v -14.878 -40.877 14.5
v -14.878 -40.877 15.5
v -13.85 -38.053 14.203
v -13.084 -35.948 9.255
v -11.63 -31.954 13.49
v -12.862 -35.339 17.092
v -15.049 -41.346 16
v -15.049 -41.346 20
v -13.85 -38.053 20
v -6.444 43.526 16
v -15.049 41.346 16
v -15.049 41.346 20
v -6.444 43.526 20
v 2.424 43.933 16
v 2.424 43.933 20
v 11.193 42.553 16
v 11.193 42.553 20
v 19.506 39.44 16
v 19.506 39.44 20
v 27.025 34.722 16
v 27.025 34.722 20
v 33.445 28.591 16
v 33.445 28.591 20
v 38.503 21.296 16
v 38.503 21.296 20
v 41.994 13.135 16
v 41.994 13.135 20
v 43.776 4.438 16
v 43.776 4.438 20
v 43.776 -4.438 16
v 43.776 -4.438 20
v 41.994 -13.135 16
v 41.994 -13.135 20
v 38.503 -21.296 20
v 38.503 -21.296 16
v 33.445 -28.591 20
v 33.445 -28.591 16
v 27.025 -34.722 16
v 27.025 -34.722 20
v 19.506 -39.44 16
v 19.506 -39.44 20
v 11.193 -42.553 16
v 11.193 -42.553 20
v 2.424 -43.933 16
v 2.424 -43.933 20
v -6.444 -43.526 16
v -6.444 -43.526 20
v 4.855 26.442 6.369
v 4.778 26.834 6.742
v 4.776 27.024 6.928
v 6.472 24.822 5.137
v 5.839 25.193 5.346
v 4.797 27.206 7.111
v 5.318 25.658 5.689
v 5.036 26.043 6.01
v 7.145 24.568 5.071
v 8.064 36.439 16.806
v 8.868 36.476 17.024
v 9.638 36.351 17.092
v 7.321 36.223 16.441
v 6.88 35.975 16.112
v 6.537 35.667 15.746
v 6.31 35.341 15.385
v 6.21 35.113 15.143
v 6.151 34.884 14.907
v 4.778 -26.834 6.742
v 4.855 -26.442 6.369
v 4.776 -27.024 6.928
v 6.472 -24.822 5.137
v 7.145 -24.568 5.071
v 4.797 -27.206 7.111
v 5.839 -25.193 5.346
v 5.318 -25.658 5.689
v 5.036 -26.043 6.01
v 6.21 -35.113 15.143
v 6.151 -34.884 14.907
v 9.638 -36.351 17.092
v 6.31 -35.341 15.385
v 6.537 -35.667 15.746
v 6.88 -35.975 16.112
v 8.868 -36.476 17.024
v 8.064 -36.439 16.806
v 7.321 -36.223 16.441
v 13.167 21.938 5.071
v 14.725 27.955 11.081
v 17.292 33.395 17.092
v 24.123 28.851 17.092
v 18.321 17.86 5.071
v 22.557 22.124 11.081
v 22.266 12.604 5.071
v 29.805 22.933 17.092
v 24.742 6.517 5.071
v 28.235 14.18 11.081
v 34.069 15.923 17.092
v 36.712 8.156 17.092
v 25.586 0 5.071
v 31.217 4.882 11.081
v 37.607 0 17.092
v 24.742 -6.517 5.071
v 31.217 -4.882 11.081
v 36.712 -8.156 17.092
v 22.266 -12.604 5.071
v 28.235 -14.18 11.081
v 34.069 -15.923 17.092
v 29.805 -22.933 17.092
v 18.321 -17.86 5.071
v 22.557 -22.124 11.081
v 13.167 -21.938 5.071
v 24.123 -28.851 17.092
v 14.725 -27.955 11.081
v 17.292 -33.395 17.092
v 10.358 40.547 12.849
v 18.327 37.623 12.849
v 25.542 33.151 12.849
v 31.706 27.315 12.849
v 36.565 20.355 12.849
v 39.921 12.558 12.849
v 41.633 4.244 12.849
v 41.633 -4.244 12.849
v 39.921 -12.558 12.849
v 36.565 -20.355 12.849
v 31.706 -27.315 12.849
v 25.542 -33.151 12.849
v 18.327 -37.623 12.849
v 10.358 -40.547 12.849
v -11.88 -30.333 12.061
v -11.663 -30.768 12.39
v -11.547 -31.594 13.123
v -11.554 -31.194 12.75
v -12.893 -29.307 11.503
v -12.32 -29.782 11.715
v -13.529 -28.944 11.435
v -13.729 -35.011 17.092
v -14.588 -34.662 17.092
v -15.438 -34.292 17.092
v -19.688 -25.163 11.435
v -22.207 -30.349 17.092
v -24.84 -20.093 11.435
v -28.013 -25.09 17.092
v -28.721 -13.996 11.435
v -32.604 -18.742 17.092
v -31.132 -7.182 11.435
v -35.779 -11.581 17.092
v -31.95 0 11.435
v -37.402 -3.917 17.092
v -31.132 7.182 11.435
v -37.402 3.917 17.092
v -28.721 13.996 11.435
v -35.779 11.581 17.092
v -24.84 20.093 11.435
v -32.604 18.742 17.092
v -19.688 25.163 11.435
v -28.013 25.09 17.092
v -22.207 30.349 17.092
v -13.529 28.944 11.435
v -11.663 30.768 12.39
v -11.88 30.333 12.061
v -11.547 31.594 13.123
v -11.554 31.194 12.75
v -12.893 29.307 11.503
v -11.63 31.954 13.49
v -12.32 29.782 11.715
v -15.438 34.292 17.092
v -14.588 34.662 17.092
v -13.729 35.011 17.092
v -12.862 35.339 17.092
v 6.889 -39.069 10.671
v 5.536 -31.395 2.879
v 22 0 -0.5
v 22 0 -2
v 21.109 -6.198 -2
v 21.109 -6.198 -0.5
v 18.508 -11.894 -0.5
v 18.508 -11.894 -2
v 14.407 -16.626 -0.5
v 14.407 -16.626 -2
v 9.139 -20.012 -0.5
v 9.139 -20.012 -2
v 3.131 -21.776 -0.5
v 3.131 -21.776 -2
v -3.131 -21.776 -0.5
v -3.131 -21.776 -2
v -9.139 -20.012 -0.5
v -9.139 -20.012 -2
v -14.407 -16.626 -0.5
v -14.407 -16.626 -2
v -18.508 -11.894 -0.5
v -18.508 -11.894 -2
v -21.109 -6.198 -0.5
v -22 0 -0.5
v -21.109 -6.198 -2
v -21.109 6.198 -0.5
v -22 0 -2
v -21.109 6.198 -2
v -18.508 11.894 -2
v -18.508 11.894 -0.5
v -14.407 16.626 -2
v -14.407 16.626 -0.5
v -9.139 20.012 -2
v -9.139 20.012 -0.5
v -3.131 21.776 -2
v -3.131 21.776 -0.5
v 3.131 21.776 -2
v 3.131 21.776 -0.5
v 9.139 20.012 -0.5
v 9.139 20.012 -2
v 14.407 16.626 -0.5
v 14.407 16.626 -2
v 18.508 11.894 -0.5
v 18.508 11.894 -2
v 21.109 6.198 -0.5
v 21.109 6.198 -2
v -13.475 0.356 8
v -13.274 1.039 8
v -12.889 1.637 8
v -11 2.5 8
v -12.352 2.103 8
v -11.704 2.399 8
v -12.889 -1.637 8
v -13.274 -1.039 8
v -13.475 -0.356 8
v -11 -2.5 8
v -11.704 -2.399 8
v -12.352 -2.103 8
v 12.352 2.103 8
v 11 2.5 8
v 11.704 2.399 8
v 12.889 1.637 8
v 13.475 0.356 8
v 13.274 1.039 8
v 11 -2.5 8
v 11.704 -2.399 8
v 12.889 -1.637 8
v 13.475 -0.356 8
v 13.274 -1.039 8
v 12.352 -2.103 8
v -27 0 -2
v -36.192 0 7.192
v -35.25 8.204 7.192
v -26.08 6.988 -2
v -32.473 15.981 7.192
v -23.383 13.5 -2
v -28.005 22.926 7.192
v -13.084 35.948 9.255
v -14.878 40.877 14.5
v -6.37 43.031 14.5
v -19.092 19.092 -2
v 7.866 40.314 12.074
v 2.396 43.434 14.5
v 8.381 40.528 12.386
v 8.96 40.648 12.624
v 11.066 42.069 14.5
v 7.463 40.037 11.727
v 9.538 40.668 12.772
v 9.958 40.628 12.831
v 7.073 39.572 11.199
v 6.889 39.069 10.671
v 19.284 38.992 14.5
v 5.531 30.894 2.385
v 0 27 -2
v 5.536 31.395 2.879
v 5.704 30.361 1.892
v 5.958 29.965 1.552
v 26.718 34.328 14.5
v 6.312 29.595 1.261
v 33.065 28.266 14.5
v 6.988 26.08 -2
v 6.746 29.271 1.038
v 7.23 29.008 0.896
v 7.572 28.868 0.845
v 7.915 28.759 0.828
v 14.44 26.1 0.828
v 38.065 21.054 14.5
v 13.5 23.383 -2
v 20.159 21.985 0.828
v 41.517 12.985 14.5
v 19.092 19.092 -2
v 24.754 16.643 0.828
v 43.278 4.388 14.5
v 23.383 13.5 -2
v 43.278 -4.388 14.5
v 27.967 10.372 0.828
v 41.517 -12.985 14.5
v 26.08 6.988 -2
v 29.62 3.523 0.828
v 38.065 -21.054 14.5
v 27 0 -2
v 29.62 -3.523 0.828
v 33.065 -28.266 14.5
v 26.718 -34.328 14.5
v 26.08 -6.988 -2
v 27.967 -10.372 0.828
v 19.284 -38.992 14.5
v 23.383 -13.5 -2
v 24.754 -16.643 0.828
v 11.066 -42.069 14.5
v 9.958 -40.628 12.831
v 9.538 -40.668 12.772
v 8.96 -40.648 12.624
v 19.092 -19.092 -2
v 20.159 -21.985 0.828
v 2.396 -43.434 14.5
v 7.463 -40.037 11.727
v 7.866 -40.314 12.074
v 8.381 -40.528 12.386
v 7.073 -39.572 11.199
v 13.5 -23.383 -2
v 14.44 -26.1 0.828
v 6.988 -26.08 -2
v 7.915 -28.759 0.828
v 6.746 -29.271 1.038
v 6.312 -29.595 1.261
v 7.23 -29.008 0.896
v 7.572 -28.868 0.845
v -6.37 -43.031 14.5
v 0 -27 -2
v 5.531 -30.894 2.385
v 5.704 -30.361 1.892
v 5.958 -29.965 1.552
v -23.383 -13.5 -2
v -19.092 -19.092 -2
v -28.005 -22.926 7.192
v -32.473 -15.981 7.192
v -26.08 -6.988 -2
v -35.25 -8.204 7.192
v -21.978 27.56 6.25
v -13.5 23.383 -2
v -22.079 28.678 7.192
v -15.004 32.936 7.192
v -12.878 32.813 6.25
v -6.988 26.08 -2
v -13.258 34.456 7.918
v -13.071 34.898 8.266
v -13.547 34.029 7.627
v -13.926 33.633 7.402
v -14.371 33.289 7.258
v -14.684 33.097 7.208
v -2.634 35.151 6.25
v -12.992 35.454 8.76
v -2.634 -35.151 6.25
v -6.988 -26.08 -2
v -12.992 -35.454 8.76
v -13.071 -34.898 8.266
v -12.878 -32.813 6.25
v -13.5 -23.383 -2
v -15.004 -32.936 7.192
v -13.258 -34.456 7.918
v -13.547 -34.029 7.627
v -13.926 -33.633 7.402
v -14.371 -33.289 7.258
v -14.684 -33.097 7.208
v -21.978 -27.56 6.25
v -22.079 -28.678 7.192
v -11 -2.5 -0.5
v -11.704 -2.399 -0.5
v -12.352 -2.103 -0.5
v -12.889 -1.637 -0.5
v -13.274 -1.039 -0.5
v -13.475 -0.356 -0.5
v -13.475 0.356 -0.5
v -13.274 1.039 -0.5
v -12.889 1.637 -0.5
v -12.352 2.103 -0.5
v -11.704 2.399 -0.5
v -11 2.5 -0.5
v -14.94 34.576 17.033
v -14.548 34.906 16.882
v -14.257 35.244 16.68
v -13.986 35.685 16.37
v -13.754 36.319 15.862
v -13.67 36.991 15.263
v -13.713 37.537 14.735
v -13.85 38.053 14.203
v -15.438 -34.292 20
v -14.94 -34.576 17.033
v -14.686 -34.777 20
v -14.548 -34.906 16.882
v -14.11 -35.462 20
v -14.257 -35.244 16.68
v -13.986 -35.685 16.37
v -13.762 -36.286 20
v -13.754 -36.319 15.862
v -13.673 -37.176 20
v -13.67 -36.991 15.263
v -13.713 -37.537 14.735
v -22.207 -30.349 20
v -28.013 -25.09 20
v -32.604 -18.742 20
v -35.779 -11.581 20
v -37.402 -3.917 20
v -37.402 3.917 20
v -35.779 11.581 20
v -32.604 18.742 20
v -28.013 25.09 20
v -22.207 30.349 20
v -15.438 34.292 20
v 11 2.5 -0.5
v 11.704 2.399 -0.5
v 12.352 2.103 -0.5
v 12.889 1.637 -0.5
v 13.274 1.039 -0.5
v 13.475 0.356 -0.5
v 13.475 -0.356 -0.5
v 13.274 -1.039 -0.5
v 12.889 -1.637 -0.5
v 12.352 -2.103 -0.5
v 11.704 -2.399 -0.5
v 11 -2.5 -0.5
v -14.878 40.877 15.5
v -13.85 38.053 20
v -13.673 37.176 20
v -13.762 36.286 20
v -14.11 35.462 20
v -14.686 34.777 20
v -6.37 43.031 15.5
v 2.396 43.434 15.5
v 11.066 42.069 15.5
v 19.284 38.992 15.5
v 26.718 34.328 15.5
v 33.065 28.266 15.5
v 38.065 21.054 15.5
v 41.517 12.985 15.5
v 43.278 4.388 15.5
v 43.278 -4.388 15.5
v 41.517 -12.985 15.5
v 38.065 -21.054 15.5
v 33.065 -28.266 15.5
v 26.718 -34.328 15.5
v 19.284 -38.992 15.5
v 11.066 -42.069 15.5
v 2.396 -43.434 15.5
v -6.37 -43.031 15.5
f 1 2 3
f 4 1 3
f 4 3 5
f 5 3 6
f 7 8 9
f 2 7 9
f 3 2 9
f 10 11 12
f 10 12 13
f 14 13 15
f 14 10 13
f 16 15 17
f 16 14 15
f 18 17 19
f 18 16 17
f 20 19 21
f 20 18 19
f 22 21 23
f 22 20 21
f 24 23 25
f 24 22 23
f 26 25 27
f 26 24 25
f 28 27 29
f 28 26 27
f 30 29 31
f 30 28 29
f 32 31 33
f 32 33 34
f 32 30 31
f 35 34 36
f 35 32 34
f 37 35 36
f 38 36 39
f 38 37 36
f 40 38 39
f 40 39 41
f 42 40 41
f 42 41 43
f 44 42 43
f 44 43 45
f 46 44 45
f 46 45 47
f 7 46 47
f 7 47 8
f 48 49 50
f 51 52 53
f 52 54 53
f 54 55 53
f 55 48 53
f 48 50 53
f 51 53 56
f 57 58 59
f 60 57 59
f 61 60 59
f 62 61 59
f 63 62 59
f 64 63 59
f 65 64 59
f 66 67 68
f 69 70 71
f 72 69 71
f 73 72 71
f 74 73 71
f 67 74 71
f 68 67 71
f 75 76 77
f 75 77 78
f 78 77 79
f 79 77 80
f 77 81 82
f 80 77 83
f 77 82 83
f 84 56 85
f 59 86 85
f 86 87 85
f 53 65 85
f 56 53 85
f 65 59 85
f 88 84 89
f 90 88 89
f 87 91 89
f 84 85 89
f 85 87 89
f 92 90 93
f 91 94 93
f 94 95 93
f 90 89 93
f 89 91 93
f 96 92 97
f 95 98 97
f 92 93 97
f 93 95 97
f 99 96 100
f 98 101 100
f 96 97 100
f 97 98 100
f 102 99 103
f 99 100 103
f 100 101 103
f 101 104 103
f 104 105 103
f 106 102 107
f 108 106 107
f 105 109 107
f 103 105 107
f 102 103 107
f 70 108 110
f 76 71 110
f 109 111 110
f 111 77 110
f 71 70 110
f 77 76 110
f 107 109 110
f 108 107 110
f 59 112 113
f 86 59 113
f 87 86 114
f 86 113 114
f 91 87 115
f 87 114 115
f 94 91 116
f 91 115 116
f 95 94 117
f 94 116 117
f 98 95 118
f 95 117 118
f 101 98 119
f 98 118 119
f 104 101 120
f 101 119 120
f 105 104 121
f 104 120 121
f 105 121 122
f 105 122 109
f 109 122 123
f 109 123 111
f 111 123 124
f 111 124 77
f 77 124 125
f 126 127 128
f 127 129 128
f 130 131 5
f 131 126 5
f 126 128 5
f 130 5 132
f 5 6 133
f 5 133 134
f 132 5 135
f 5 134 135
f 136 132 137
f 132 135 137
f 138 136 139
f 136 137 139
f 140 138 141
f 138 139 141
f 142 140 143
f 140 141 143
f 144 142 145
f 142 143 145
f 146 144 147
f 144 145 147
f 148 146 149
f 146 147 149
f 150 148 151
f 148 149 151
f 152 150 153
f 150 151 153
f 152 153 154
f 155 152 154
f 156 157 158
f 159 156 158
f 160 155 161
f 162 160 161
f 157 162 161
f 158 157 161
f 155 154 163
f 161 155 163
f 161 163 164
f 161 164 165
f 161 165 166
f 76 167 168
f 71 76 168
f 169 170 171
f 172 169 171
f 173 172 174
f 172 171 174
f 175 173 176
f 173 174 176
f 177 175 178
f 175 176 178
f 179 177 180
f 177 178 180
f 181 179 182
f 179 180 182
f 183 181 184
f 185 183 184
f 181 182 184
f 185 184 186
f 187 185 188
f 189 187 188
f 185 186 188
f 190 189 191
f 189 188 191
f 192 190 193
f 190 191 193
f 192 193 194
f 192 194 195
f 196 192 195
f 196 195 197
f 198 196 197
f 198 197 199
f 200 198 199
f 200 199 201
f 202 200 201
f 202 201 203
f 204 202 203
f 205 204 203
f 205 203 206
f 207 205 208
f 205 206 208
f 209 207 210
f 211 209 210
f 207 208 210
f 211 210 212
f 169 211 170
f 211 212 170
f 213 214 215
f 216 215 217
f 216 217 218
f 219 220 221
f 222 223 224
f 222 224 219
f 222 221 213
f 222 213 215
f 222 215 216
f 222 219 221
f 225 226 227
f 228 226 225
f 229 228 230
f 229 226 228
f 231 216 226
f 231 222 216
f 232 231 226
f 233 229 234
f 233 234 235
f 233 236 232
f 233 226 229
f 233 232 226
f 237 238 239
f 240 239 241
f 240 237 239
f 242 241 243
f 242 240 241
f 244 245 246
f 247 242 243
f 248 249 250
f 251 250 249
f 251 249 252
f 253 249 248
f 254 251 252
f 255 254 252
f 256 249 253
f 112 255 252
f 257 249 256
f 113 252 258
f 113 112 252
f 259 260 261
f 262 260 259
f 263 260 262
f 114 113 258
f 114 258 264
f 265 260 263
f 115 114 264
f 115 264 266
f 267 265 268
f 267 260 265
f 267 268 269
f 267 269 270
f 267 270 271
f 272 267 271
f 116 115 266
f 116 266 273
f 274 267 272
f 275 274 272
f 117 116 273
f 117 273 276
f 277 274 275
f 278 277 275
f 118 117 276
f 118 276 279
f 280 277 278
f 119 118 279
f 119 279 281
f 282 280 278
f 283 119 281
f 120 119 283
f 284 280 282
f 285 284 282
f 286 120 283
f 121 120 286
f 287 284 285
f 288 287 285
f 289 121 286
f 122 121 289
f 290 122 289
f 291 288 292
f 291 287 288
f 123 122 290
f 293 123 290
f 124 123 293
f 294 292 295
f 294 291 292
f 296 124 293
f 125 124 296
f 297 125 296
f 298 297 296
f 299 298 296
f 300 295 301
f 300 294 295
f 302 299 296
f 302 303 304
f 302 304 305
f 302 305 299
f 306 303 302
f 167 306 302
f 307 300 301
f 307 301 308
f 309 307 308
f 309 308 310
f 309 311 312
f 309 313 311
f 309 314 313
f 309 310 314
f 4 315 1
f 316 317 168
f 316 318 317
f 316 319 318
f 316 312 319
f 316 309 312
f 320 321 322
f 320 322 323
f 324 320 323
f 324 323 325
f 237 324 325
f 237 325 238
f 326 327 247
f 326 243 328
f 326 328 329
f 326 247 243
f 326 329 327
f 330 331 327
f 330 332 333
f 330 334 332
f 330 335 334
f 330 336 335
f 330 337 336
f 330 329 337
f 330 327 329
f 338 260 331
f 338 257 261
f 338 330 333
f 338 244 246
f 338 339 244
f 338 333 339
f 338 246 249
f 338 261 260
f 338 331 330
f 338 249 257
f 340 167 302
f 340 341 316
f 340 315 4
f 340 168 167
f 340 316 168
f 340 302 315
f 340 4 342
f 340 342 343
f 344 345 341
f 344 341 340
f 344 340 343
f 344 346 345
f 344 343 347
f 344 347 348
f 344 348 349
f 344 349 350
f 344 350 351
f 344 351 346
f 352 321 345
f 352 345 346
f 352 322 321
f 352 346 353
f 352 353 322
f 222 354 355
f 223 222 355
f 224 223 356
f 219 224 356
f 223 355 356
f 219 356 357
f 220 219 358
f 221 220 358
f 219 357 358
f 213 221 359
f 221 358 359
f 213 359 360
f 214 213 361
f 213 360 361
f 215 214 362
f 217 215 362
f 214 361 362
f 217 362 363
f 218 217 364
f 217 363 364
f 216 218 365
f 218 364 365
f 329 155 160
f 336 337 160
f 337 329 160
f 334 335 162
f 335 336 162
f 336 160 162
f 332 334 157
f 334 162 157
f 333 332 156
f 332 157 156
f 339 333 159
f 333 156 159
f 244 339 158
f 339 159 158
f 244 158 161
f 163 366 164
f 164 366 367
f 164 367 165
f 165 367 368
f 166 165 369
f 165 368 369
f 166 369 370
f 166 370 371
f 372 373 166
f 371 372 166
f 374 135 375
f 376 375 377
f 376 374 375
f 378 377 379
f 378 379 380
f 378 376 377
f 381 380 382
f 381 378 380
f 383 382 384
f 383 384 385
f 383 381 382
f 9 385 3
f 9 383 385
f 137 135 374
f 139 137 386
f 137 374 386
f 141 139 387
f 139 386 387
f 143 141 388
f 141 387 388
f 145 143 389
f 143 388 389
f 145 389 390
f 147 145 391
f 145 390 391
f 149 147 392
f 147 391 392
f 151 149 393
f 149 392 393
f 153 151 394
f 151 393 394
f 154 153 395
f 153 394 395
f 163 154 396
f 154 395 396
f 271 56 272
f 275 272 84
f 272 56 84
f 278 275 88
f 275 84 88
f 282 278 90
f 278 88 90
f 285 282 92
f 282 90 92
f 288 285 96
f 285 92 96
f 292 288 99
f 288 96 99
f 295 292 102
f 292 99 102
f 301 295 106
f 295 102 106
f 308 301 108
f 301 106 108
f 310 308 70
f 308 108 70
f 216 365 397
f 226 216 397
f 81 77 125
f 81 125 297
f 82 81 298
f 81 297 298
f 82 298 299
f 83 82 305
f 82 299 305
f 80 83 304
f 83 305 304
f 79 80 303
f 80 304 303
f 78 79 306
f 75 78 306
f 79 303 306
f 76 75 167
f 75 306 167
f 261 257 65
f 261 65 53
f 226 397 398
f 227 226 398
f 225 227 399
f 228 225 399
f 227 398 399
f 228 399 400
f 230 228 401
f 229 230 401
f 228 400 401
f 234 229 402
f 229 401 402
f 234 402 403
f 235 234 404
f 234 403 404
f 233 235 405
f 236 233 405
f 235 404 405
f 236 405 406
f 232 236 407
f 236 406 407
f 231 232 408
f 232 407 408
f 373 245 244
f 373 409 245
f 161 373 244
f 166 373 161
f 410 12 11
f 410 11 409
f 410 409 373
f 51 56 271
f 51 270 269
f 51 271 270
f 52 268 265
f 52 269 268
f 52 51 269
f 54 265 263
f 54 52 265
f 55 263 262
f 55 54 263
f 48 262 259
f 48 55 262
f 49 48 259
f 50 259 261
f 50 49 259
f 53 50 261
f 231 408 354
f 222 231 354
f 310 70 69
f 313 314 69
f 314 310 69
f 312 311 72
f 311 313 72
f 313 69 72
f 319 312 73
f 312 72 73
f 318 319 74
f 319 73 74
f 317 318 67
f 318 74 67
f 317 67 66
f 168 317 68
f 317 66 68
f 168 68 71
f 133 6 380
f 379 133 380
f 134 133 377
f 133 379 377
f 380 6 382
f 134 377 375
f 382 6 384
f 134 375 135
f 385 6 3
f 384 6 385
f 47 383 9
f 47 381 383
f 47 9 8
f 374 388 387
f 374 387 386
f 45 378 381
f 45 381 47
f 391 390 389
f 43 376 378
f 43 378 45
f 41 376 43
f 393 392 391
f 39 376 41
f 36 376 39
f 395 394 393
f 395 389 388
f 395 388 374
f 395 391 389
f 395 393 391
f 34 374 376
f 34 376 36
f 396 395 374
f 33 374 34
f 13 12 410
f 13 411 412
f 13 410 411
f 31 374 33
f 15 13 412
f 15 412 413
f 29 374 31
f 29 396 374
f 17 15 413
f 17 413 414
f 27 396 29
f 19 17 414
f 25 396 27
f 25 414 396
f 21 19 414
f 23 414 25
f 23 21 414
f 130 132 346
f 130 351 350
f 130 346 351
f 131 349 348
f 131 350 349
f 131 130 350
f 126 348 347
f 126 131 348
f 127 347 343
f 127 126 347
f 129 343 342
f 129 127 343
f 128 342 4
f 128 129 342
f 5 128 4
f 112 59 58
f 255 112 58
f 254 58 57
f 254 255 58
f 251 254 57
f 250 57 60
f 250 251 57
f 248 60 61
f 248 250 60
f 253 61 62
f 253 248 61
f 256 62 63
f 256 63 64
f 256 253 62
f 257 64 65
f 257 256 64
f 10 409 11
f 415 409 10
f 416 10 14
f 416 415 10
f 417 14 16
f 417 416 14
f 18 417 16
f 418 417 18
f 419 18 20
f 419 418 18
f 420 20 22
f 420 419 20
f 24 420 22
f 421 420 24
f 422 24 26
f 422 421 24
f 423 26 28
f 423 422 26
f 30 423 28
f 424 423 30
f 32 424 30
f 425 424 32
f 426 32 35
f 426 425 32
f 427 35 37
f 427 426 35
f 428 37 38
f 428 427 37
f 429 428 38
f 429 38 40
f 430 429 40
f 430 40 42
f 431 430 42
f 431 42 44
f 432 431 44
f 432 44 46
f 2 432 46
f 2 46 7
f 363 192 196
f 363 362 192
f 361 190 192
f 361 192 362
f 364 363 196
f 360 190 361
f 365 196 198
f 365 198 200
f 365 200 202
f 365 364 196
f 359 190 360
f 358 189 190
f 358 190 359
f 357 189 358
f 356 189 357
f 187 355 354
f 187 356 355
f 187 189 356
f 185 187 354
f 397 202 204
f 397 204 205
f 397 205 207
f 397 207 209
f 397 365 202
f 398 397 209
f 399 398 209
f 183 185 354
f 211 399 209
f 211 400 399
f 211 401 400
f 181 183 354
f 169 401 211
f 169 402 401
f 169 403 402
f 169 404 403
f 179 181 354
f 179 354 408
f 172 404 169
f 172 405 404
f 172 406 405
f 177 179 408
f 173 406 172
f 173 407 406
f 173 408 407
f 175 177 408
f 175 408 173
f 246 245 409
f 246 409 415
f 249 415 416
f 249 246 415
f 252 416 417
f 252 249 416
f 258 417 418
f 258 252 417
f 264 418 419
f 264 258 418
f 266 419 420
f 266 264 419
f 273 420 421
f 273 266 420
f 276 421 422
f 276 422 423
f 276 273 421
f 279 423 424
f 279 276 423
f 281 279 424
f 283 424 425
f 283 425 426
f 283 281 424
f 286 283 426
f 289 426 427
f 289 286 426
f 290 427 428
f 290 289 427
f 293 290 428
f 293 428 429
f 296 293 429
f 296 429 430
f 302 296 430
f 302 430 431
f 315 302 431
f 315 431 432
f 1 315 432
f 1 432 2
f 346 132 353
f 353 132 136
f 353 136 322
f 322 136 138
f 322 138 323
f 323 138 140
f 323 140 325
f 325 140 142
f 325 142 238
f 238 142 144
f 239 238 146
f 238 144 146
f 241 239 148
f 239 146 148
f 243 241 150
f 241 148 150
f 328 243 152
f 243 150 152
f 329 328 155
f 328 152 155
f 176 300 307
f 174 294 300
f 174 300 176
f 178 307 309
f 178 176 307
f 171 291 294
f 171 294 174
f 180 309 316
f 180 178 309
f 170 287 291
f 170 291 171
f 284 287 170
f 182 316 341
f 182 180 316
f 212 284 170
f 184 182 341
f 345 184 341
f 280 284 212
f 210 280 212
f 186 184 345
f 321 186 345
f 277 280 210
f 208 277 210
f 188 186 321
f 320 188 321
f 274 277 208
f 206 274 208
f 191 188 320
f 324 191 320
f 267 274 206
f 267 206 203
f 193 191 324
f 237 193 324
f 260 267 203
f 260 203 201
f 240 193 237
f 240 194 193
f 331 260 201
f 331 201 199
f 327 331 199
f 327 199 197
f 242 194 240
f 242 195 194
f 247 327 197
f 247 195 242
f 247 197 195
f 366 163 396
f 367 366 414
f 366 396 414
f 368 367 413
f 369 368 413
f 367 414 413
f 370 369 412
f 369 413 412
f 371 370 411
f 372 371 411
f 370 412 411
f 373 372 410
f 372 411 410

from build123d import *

# Parameters (mm, degrees)
F3_W           = 8.3933982822
F3_H           = 16.3933982822
F4_ANGLE_BACK  = 70
F4_ANGLE       = 140
F6_ANGLE_START = 100
F6_ANGLE       = 160
F7_ANGLE_BACK  = 70
F7_ANGLE       = 140
F8_R           = 3
F8_2_R         = 3
F9_R           = 3
F13_DEPTH      = 10
F14_R          = 22
F15_DEPTH      = 1.5


with BuildPart() as f1:
    # F0 (on Front) → F1 (revolve)
    with BuildSketch(Plane.XZ):
        Polygon((-43.5, 14.5), (-27, -2), (0, -2), (0, 20), (-44, 20), (-44, 16), (-43.5, 15.5), align=None)
    revolve(axis=Axis((0, 0, 9.4880101401), (0, 0, -1)))


with BuildPart() as f4:
    # F3 (on Front) → F4 (revolve)
    with BuildSketch(Plane.XZ, mode=Mode.PRIVATE) as f4_sk:
        with Locations((-41.8033008589, 16.8033008589)):
            Rectangle(F3_W, F3_H)
    revolve(f4_sk.sketch.rotate(Axis((0, 0, 9.4880101401), (0, 0, -1)), -F4_ANGLE_BACK), axis=Axis((0, 0, 9.4880101401), (0, 0, -1)), revolution_arc=F4_ANGLE)

    # F8#2
    f8_2_edges = [f4.edges().sort_by_distance(p)[0] for p in [
        (-12.862215, 35.338646, 16.803301),
        (-12.862215, -35.338646, 16.803301),
    ]]
    fillet(f8_2_edges, radius=F8_2_R)


with BuildPart() as f6:
    # F5 (on Front) → F6 (revolve)
    with BuildSketch(Plane.XZ, mode=Mode.PRIVATE) as f6_sk:
        Polygon((-36.8994949366, -6.2426406871), (-25.5857864376, 5.0710678119), (-37.6066017178, 17.091883092), (-48.9203102168, 5.7781745931), align=None)
    revolve(f6_sk.sketch.rotate(Axis((0, 0, 9), (0, 0, -1)), F6_ANGLE_START), axis=Axis((0, 0, 9), (0, 0, -1)), revolution_arc=F6_ANGLE)

    # F9
    f9_edges = [f6.edges().sort_by_distance(p)[0] for p in [
        (5.425228, 30.767995, -0.585786),
        (7.51262, 42.606187, 11.435029),
        (7.51262, -42.606187, 11.435029),
        (5.425228, -30.767995, -0.585786),
    ]]
    fillet(f9_edges, radius=F9_R)


with BuildPart() as f7:
    # F2 (on Front) → F7 (revolve)
    with BuildSketch(Plane.XZ, mode=Mode.PRIVATE) as f7_sk:
        Polygon((-41.2877159425, 2.0970603683), (-31.9497474683, 11.4350288425), (-37.6066017178, 17.091883092), (-46.944570192, 7.7539146178), align=None)
    revolve(f7_sk.sketch.rotate(Axis((0, 0, 9), (0, 0, -1)), -F7_ANGLE_BACK), axis=Axis((0, 0, 9), (0, 0, -1)), revolution_arc=F7_ANGLE)

    # F8
    f8_edges = [f7.edges().sort_by_distance(p)[0] for p in [
        (-12.524344, -34.410352, 6.766045),
        (-12.524344, 34.410352, 6.766045),
    ]]
    fillet(f8_edges, radius=F8_R)


with BuildPart() as f1_1:
    add(f1.part)

    # F10: cut F7, F4, F6
    add(f7.part, mode=Mode.SUBTRACT)
    add(f4.part, mode=Mode.SUBTRACT)
    add(f6.part, mode=Mode.SUBTRACT)

    # F12 (on offset) → F13 (cut)
    with BuildSketch(Plane(origin=(0, 0, -2), x_dir=(1, 0, 0), z_dir=(0, 0, -1))):
        with BuildLine():
            ThreePointArc((-11, 2.5), (-13.5, 0), (-11, -2.5))
            Line((-11, -2.5), (0, -2.5))
            Line((0, -2.5), (11, -2.5))
            ThreePointArc((11, -2.5), (13.5, 0), (11, 2.5))
            Line((11, 2.5), (0, 2.5))
            Line((0, 2.5), (-11, 2.5))
        make_face()
    extrude(amount=-F13_DEPTH, mode=Mode.SUBTRACT)

    # F14 (on offset) → F15 (cut)
    with BuildSketch(Plane(origin=(0, 0, -2), x_dir=(1, 0, 0), z_dir=(0, 0, -1))):
        Circle(F14_R)
    extrude(amount=-F15_DEPTH, mode=Mode.SUBTRACT)


solid = f1_1.part
